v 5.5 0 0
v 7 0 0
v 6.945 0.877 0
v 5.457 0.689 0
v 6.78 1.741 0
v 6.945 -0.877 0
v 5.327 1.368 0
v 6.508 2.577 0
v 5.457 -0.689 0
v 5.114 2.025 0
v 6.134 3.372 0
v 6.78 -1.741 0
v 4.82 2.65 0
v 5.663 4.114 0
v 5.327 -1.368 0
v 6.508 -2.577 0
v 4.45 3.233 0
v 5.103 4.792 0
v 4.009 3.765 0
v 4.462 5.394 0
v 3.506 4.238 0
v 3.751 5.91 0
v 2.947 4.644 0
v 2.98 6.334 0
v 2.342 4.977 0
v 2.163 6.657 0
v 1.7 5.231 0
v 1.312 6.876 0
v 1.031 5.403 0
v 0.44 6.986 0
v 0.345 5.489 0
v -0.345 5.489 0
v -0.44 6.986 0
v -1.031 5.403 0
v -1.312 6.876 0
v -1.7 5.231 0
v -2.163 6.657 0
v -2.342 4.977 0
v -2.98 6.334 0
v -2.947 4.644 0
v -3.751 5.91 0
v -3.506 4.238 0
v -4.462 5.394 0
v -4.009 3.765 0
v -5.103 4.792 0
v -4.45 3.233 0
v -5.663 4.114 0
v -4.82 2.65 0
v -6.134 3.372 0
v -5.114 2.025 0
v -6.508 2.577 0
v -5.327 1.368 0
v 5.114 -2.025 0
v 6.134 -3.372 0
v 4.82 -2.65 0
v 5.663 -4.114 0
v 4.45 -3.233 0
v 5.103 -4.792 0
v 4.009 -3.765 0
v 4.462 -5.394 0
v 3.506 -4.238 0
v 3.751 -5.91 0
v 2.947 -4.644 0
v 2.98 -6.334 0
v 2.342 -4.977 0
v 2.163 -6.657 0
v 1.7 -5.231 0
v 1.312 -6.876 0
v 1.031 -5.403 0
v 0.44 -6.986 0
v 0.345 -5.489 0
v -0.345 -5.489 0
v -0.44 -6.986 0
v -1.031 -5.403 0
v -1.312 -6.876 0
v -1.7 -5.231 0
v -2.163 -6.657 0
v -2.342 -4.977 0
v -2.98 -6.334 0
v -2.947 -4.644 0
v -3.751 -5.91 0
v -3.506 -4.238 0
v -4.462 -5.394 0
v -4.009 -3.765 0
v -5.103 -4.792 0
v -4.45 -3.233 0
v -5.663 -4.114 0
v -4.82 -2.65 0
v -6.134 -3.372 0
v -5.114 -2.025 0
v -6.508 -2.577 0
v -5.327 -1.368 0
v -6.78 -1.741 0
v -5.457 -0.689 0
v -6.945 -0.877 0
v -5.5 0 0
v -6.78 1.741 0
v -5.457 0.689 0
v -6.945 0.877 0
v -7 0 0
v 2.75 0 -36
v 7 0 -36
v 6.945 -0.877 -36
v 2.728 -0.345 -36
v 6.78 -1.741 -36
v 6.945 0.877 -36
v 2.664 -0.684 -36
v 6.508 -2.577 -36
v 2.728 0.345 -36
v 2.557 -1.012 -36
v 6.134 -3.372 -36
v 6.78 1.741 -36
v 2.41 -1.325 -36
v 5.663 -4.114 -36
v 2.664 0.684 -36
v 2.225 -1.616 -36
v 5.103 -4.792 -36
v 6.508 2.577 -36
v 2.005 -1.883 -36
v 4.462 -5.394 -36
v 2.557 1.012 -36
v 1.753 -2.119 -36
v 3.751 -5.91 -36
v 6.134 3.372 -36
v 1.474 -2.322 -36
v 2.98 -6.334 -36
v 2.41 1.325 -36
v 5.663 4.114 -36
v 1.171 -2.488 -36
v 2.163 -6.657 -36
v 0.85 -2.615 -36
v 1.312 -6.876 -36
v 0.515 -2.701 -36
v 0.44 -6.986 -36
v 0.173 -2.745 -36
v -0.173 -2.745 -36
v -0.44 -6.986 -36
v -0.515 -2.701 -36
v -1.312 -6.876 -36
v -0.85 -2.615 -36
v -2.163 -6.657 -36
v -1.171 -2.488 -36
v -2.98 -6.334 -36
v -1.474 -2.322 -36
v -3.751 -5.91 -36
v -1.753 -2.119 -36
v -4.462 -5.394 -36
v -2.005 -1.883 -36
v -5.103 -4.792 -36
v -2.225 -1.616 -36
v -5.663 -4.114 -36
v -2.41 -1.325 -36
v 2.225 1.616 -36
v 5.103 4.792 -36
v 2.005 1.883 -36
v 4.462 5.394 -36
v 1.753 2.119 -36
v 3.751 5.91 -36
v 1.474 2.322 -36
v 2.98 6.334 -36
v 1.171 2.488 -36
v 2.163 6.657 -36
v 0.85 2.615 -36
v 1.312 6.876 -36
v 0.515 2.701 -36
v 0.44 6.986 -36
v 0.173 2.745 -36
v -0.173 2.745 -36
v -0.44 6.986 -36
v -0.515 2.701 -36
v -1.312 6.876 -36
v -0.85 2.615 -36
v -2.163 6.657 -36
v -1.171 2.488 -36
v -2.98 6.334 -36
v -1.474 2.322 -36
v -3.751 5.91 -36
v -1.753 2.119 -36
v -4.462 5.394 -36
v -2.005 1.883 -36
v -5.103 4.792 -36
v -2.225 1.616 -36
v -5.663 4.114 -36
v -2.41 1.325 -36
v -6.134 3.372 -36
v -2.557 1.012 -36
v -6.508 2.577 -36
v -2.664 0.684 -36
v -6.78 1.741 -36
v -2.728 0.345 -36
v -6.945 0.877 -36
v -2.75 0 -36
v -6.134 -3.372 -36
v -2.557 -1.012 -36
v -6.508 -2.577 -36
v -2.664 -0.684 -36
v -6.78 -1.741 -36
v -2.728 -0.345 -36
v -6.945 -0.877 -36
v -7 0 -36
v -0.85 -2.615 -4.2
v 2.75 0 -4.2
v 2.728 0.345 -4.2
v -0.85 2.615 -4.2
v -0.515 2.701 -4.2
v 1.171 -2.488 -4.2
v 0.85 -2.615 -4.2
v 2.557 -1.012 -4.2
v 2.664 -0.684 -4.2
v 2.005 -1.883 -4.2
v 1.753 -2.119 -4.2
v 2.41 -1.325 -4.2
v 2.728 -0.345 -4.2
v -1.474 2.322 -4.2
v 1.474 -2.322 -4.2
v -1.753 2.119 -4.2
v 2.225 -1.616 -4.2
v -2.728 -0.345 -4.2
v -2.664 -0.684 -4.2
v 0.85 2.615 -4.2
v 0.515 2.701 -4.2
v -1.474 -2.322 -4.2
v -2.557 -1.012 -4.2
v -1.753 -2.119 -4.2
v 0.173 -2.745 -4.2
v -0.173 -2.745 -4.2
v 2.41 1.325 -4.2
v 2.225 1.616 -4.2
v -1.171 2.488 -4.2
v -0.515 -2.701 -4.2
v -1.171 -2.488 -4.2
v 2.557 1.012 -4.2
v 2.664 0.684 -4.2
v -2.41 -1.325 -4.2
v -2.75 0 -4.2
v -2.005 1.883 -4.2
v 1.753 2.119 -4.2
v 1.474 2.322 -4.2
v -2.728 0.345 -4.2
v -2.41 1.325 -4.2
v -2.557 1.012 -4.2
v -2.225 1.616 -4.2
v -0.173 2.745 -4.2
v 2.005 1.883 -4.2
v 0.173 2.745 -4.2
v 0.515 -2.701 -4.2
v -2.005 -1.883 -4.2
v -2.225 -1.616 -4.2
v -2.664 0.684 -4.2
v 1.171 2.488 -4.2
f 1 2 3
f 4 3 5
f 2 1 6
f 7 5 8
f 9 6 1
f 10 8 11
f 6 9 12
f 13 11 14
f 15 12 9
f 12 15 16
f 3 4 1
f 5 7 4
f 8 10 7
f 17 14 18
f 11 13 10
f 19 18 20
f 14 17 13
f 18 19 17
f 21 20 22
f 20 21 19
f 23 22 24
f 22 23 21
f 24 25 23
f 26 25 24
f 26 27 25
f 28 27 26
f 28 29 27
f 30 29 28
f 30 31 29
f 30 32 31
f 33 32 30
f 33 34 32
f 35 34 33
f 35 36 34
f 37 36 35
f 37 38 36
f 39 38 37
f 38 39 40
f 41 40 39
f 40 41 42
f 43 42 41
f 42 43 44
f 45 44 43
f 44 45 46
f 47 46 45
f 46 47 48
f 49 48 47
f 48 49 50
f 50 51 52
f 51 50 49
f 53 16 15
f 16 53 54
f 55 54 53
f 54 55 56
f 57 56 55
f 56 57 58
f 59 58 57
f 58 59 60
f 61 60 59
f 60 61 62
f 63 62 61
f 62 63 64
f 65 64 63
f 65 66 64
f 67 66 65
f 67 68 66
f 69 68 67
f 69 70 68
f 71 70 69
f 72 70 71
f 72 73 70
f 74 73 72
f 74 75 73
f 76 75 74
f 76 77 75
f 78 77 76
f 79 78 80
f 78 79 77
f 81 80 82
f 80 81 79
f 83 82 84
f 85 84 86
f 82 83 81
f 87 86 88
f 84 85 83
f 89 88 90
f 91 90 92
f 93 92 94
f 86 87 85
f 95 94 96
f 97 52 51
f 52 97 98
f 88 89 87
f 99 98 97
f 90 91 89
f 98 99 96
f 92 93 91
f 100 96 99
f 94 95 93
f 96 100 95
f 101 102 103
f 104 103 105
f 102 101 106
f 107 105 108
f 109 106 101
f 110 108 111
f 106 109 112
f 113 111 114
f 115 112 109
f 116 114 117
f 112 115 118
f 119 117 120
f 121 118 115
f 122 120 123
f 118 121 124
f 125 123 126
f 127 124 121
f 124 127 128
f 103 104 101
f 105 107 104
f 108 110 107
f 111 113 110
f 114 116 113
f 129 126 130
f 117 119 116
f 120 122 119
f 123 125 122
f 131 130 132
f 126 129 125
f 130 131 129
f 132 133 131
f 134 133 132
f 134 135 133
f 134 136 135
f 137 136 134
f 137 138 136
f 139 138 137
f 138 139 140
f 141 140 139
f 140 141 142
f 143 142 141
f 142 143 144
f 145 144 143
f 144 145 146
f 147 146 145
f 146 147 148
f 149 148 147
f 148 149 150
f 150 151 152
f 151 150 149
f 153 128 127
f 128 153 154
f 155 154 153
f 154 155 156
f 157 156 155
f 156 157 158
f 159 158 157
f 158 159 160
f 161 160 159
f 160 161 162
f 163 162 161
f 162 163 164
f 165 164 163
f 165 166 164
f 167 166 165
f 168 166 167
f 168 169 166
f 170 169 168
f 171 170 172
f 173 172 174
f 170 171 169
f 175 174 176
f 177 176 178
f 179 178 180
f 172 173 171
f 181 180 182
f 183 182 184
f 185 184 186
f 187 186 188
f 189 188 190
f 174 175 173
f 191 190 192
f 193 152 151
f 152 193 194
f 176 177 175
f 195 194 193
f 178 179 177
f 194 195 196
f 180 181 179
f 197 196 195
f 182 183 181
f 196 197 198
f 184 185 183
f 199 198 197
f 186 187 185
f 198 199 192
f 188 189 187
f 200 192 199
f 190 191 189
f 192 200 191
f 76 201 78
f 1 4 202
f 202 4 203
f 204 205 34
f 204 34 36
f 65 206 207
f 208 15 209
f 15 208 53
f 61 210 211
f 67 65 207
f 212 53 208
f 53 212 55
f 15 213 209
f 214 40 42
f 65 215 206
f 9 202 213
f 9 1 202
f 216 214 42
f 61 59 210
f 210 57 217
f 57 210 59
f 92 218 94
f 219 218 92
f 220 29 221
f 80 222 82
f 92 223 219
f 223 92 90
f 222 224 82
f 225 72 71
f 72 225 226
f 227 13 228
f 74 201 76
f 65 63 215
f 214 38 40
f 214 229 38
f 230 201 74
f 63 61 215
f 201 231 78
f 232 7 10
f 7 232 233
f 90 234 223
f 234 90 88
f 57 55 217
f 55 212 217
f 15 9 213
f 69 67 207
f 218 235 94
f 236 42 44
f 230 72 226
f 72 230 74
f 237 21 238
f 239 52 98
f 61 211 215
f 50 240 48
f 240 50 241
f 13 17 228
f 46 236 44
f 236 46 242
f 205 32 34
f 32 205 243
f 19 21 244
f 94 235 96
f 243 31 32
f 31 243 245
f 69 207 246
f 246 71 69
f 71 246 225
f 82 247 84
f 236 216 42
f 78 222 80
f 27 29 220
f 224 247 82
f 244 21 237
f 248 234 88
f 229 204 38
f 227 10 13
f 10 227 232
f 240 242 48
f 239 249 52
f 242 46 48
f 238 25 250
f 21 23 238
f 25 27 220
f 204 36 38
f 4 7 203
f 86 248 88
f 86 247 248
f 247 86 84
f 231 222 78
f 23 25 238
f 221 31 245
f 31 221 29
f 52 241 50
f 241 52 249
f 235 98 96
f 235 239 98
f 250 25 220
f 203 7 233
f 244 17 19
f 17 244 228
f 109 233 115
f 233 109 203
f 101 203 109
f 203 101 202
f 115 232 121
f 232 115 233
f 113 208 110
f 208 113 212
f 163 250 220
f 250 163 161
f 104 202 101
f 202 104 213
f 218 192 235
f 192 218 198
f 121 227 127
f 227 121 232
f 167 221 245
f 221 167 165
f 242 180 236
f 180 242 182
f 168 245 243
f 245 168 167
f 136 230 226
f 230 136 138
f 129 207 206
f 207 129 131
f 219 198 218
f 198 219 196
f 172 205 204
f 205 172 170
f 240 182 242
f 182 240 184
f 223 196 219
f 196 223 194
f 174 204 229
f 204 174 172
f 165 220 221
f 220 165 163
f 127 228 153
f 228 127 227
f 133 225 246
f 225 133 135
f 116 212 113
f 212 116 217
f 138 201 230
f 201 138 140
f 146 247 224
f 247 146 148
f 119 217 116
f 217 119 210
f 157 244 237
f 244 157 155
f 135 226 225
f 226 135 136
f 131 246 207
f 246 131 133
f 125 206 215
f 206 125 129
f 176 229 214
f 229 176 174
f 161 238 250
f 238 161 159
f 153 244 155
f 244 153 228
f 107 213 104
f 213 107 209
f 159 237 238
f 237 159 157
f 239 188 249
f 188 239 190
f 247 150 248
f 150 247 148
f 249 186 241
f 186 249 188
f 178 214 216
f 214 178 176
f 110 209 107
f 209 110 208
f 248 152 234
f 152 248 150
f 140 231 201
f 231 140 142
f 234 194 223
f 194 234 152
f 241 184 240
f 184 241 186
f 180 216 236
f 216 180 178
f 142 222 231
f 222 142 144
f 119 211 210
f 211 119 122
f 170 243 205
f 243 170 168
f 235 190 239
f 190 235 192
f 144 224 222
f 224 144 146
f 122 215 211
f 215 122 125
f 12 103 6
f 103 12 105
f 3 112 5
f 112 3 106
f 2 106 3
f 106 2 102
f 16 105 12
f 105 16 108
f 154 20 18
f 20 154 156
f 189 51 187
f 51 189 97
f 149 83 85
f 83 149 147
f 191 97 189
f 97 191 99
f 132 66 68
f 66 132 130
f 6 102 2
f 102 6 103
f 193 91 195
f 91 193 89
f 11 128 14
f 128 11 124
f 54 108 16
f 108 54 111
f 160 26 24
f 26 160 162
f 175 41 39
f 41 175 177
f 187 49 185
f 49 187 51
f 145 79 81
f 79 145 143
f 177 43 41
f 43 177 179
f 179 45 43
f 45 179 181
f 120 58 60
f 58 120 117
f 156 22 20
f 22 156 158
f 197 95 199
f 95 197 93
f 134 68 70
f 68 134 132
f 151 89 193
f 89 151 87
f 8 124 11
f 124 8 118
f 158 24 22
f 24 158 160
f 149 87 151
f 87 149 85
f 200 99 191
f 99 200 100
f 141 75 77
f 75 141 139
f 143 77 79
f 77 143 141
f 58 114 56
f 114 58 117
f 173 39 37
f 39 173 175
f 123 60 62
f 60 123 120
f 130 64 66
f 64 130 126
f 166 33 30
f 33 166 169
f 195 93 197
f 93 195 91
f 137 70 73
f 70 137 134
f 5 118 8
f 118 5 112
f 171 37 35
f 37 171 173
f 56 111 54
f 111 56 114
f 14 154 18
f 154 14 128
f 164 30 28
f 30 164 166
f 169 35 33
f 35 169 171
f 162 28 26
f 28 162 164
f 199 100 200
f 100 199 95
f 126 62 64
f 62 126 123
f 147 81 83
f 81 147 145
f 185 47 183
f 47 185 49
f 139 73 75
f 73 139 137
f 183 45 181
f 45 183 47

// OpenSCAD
$fn = 50;


difference() {
	union() {
		translate(v = [0, 0, -36.0000000000]) {
			cylinder(h = 36, r = 7.0000000000);
		}
	}
	union() {
		translate(v = [0, 0, 0]) {
			rotate(a = [0, 0, 0]) {
				difference() {
					union() {
						#translate(v = [0, 0, -36.0000000000]) {
							cylinder(h = 36, r = 2.2500000000);
						}
						#translate(v = [0, 0, -4.2000000000]) {
							cylinder(h = 4.2000000000, r1 = 2.7500000000, r2 = 5.5000000000);
						}
						#translate(v = [0, 0, -36.0000000000]) {
							cylinder(h = 36, r = 2.7500000000);
						}
						#translate(v = [0, 0, -36.0000000000]) {
							cylinder(h = 36, r = 2.2500000000);
						}
					}
					union();
				}
			}
		}
	}
}
